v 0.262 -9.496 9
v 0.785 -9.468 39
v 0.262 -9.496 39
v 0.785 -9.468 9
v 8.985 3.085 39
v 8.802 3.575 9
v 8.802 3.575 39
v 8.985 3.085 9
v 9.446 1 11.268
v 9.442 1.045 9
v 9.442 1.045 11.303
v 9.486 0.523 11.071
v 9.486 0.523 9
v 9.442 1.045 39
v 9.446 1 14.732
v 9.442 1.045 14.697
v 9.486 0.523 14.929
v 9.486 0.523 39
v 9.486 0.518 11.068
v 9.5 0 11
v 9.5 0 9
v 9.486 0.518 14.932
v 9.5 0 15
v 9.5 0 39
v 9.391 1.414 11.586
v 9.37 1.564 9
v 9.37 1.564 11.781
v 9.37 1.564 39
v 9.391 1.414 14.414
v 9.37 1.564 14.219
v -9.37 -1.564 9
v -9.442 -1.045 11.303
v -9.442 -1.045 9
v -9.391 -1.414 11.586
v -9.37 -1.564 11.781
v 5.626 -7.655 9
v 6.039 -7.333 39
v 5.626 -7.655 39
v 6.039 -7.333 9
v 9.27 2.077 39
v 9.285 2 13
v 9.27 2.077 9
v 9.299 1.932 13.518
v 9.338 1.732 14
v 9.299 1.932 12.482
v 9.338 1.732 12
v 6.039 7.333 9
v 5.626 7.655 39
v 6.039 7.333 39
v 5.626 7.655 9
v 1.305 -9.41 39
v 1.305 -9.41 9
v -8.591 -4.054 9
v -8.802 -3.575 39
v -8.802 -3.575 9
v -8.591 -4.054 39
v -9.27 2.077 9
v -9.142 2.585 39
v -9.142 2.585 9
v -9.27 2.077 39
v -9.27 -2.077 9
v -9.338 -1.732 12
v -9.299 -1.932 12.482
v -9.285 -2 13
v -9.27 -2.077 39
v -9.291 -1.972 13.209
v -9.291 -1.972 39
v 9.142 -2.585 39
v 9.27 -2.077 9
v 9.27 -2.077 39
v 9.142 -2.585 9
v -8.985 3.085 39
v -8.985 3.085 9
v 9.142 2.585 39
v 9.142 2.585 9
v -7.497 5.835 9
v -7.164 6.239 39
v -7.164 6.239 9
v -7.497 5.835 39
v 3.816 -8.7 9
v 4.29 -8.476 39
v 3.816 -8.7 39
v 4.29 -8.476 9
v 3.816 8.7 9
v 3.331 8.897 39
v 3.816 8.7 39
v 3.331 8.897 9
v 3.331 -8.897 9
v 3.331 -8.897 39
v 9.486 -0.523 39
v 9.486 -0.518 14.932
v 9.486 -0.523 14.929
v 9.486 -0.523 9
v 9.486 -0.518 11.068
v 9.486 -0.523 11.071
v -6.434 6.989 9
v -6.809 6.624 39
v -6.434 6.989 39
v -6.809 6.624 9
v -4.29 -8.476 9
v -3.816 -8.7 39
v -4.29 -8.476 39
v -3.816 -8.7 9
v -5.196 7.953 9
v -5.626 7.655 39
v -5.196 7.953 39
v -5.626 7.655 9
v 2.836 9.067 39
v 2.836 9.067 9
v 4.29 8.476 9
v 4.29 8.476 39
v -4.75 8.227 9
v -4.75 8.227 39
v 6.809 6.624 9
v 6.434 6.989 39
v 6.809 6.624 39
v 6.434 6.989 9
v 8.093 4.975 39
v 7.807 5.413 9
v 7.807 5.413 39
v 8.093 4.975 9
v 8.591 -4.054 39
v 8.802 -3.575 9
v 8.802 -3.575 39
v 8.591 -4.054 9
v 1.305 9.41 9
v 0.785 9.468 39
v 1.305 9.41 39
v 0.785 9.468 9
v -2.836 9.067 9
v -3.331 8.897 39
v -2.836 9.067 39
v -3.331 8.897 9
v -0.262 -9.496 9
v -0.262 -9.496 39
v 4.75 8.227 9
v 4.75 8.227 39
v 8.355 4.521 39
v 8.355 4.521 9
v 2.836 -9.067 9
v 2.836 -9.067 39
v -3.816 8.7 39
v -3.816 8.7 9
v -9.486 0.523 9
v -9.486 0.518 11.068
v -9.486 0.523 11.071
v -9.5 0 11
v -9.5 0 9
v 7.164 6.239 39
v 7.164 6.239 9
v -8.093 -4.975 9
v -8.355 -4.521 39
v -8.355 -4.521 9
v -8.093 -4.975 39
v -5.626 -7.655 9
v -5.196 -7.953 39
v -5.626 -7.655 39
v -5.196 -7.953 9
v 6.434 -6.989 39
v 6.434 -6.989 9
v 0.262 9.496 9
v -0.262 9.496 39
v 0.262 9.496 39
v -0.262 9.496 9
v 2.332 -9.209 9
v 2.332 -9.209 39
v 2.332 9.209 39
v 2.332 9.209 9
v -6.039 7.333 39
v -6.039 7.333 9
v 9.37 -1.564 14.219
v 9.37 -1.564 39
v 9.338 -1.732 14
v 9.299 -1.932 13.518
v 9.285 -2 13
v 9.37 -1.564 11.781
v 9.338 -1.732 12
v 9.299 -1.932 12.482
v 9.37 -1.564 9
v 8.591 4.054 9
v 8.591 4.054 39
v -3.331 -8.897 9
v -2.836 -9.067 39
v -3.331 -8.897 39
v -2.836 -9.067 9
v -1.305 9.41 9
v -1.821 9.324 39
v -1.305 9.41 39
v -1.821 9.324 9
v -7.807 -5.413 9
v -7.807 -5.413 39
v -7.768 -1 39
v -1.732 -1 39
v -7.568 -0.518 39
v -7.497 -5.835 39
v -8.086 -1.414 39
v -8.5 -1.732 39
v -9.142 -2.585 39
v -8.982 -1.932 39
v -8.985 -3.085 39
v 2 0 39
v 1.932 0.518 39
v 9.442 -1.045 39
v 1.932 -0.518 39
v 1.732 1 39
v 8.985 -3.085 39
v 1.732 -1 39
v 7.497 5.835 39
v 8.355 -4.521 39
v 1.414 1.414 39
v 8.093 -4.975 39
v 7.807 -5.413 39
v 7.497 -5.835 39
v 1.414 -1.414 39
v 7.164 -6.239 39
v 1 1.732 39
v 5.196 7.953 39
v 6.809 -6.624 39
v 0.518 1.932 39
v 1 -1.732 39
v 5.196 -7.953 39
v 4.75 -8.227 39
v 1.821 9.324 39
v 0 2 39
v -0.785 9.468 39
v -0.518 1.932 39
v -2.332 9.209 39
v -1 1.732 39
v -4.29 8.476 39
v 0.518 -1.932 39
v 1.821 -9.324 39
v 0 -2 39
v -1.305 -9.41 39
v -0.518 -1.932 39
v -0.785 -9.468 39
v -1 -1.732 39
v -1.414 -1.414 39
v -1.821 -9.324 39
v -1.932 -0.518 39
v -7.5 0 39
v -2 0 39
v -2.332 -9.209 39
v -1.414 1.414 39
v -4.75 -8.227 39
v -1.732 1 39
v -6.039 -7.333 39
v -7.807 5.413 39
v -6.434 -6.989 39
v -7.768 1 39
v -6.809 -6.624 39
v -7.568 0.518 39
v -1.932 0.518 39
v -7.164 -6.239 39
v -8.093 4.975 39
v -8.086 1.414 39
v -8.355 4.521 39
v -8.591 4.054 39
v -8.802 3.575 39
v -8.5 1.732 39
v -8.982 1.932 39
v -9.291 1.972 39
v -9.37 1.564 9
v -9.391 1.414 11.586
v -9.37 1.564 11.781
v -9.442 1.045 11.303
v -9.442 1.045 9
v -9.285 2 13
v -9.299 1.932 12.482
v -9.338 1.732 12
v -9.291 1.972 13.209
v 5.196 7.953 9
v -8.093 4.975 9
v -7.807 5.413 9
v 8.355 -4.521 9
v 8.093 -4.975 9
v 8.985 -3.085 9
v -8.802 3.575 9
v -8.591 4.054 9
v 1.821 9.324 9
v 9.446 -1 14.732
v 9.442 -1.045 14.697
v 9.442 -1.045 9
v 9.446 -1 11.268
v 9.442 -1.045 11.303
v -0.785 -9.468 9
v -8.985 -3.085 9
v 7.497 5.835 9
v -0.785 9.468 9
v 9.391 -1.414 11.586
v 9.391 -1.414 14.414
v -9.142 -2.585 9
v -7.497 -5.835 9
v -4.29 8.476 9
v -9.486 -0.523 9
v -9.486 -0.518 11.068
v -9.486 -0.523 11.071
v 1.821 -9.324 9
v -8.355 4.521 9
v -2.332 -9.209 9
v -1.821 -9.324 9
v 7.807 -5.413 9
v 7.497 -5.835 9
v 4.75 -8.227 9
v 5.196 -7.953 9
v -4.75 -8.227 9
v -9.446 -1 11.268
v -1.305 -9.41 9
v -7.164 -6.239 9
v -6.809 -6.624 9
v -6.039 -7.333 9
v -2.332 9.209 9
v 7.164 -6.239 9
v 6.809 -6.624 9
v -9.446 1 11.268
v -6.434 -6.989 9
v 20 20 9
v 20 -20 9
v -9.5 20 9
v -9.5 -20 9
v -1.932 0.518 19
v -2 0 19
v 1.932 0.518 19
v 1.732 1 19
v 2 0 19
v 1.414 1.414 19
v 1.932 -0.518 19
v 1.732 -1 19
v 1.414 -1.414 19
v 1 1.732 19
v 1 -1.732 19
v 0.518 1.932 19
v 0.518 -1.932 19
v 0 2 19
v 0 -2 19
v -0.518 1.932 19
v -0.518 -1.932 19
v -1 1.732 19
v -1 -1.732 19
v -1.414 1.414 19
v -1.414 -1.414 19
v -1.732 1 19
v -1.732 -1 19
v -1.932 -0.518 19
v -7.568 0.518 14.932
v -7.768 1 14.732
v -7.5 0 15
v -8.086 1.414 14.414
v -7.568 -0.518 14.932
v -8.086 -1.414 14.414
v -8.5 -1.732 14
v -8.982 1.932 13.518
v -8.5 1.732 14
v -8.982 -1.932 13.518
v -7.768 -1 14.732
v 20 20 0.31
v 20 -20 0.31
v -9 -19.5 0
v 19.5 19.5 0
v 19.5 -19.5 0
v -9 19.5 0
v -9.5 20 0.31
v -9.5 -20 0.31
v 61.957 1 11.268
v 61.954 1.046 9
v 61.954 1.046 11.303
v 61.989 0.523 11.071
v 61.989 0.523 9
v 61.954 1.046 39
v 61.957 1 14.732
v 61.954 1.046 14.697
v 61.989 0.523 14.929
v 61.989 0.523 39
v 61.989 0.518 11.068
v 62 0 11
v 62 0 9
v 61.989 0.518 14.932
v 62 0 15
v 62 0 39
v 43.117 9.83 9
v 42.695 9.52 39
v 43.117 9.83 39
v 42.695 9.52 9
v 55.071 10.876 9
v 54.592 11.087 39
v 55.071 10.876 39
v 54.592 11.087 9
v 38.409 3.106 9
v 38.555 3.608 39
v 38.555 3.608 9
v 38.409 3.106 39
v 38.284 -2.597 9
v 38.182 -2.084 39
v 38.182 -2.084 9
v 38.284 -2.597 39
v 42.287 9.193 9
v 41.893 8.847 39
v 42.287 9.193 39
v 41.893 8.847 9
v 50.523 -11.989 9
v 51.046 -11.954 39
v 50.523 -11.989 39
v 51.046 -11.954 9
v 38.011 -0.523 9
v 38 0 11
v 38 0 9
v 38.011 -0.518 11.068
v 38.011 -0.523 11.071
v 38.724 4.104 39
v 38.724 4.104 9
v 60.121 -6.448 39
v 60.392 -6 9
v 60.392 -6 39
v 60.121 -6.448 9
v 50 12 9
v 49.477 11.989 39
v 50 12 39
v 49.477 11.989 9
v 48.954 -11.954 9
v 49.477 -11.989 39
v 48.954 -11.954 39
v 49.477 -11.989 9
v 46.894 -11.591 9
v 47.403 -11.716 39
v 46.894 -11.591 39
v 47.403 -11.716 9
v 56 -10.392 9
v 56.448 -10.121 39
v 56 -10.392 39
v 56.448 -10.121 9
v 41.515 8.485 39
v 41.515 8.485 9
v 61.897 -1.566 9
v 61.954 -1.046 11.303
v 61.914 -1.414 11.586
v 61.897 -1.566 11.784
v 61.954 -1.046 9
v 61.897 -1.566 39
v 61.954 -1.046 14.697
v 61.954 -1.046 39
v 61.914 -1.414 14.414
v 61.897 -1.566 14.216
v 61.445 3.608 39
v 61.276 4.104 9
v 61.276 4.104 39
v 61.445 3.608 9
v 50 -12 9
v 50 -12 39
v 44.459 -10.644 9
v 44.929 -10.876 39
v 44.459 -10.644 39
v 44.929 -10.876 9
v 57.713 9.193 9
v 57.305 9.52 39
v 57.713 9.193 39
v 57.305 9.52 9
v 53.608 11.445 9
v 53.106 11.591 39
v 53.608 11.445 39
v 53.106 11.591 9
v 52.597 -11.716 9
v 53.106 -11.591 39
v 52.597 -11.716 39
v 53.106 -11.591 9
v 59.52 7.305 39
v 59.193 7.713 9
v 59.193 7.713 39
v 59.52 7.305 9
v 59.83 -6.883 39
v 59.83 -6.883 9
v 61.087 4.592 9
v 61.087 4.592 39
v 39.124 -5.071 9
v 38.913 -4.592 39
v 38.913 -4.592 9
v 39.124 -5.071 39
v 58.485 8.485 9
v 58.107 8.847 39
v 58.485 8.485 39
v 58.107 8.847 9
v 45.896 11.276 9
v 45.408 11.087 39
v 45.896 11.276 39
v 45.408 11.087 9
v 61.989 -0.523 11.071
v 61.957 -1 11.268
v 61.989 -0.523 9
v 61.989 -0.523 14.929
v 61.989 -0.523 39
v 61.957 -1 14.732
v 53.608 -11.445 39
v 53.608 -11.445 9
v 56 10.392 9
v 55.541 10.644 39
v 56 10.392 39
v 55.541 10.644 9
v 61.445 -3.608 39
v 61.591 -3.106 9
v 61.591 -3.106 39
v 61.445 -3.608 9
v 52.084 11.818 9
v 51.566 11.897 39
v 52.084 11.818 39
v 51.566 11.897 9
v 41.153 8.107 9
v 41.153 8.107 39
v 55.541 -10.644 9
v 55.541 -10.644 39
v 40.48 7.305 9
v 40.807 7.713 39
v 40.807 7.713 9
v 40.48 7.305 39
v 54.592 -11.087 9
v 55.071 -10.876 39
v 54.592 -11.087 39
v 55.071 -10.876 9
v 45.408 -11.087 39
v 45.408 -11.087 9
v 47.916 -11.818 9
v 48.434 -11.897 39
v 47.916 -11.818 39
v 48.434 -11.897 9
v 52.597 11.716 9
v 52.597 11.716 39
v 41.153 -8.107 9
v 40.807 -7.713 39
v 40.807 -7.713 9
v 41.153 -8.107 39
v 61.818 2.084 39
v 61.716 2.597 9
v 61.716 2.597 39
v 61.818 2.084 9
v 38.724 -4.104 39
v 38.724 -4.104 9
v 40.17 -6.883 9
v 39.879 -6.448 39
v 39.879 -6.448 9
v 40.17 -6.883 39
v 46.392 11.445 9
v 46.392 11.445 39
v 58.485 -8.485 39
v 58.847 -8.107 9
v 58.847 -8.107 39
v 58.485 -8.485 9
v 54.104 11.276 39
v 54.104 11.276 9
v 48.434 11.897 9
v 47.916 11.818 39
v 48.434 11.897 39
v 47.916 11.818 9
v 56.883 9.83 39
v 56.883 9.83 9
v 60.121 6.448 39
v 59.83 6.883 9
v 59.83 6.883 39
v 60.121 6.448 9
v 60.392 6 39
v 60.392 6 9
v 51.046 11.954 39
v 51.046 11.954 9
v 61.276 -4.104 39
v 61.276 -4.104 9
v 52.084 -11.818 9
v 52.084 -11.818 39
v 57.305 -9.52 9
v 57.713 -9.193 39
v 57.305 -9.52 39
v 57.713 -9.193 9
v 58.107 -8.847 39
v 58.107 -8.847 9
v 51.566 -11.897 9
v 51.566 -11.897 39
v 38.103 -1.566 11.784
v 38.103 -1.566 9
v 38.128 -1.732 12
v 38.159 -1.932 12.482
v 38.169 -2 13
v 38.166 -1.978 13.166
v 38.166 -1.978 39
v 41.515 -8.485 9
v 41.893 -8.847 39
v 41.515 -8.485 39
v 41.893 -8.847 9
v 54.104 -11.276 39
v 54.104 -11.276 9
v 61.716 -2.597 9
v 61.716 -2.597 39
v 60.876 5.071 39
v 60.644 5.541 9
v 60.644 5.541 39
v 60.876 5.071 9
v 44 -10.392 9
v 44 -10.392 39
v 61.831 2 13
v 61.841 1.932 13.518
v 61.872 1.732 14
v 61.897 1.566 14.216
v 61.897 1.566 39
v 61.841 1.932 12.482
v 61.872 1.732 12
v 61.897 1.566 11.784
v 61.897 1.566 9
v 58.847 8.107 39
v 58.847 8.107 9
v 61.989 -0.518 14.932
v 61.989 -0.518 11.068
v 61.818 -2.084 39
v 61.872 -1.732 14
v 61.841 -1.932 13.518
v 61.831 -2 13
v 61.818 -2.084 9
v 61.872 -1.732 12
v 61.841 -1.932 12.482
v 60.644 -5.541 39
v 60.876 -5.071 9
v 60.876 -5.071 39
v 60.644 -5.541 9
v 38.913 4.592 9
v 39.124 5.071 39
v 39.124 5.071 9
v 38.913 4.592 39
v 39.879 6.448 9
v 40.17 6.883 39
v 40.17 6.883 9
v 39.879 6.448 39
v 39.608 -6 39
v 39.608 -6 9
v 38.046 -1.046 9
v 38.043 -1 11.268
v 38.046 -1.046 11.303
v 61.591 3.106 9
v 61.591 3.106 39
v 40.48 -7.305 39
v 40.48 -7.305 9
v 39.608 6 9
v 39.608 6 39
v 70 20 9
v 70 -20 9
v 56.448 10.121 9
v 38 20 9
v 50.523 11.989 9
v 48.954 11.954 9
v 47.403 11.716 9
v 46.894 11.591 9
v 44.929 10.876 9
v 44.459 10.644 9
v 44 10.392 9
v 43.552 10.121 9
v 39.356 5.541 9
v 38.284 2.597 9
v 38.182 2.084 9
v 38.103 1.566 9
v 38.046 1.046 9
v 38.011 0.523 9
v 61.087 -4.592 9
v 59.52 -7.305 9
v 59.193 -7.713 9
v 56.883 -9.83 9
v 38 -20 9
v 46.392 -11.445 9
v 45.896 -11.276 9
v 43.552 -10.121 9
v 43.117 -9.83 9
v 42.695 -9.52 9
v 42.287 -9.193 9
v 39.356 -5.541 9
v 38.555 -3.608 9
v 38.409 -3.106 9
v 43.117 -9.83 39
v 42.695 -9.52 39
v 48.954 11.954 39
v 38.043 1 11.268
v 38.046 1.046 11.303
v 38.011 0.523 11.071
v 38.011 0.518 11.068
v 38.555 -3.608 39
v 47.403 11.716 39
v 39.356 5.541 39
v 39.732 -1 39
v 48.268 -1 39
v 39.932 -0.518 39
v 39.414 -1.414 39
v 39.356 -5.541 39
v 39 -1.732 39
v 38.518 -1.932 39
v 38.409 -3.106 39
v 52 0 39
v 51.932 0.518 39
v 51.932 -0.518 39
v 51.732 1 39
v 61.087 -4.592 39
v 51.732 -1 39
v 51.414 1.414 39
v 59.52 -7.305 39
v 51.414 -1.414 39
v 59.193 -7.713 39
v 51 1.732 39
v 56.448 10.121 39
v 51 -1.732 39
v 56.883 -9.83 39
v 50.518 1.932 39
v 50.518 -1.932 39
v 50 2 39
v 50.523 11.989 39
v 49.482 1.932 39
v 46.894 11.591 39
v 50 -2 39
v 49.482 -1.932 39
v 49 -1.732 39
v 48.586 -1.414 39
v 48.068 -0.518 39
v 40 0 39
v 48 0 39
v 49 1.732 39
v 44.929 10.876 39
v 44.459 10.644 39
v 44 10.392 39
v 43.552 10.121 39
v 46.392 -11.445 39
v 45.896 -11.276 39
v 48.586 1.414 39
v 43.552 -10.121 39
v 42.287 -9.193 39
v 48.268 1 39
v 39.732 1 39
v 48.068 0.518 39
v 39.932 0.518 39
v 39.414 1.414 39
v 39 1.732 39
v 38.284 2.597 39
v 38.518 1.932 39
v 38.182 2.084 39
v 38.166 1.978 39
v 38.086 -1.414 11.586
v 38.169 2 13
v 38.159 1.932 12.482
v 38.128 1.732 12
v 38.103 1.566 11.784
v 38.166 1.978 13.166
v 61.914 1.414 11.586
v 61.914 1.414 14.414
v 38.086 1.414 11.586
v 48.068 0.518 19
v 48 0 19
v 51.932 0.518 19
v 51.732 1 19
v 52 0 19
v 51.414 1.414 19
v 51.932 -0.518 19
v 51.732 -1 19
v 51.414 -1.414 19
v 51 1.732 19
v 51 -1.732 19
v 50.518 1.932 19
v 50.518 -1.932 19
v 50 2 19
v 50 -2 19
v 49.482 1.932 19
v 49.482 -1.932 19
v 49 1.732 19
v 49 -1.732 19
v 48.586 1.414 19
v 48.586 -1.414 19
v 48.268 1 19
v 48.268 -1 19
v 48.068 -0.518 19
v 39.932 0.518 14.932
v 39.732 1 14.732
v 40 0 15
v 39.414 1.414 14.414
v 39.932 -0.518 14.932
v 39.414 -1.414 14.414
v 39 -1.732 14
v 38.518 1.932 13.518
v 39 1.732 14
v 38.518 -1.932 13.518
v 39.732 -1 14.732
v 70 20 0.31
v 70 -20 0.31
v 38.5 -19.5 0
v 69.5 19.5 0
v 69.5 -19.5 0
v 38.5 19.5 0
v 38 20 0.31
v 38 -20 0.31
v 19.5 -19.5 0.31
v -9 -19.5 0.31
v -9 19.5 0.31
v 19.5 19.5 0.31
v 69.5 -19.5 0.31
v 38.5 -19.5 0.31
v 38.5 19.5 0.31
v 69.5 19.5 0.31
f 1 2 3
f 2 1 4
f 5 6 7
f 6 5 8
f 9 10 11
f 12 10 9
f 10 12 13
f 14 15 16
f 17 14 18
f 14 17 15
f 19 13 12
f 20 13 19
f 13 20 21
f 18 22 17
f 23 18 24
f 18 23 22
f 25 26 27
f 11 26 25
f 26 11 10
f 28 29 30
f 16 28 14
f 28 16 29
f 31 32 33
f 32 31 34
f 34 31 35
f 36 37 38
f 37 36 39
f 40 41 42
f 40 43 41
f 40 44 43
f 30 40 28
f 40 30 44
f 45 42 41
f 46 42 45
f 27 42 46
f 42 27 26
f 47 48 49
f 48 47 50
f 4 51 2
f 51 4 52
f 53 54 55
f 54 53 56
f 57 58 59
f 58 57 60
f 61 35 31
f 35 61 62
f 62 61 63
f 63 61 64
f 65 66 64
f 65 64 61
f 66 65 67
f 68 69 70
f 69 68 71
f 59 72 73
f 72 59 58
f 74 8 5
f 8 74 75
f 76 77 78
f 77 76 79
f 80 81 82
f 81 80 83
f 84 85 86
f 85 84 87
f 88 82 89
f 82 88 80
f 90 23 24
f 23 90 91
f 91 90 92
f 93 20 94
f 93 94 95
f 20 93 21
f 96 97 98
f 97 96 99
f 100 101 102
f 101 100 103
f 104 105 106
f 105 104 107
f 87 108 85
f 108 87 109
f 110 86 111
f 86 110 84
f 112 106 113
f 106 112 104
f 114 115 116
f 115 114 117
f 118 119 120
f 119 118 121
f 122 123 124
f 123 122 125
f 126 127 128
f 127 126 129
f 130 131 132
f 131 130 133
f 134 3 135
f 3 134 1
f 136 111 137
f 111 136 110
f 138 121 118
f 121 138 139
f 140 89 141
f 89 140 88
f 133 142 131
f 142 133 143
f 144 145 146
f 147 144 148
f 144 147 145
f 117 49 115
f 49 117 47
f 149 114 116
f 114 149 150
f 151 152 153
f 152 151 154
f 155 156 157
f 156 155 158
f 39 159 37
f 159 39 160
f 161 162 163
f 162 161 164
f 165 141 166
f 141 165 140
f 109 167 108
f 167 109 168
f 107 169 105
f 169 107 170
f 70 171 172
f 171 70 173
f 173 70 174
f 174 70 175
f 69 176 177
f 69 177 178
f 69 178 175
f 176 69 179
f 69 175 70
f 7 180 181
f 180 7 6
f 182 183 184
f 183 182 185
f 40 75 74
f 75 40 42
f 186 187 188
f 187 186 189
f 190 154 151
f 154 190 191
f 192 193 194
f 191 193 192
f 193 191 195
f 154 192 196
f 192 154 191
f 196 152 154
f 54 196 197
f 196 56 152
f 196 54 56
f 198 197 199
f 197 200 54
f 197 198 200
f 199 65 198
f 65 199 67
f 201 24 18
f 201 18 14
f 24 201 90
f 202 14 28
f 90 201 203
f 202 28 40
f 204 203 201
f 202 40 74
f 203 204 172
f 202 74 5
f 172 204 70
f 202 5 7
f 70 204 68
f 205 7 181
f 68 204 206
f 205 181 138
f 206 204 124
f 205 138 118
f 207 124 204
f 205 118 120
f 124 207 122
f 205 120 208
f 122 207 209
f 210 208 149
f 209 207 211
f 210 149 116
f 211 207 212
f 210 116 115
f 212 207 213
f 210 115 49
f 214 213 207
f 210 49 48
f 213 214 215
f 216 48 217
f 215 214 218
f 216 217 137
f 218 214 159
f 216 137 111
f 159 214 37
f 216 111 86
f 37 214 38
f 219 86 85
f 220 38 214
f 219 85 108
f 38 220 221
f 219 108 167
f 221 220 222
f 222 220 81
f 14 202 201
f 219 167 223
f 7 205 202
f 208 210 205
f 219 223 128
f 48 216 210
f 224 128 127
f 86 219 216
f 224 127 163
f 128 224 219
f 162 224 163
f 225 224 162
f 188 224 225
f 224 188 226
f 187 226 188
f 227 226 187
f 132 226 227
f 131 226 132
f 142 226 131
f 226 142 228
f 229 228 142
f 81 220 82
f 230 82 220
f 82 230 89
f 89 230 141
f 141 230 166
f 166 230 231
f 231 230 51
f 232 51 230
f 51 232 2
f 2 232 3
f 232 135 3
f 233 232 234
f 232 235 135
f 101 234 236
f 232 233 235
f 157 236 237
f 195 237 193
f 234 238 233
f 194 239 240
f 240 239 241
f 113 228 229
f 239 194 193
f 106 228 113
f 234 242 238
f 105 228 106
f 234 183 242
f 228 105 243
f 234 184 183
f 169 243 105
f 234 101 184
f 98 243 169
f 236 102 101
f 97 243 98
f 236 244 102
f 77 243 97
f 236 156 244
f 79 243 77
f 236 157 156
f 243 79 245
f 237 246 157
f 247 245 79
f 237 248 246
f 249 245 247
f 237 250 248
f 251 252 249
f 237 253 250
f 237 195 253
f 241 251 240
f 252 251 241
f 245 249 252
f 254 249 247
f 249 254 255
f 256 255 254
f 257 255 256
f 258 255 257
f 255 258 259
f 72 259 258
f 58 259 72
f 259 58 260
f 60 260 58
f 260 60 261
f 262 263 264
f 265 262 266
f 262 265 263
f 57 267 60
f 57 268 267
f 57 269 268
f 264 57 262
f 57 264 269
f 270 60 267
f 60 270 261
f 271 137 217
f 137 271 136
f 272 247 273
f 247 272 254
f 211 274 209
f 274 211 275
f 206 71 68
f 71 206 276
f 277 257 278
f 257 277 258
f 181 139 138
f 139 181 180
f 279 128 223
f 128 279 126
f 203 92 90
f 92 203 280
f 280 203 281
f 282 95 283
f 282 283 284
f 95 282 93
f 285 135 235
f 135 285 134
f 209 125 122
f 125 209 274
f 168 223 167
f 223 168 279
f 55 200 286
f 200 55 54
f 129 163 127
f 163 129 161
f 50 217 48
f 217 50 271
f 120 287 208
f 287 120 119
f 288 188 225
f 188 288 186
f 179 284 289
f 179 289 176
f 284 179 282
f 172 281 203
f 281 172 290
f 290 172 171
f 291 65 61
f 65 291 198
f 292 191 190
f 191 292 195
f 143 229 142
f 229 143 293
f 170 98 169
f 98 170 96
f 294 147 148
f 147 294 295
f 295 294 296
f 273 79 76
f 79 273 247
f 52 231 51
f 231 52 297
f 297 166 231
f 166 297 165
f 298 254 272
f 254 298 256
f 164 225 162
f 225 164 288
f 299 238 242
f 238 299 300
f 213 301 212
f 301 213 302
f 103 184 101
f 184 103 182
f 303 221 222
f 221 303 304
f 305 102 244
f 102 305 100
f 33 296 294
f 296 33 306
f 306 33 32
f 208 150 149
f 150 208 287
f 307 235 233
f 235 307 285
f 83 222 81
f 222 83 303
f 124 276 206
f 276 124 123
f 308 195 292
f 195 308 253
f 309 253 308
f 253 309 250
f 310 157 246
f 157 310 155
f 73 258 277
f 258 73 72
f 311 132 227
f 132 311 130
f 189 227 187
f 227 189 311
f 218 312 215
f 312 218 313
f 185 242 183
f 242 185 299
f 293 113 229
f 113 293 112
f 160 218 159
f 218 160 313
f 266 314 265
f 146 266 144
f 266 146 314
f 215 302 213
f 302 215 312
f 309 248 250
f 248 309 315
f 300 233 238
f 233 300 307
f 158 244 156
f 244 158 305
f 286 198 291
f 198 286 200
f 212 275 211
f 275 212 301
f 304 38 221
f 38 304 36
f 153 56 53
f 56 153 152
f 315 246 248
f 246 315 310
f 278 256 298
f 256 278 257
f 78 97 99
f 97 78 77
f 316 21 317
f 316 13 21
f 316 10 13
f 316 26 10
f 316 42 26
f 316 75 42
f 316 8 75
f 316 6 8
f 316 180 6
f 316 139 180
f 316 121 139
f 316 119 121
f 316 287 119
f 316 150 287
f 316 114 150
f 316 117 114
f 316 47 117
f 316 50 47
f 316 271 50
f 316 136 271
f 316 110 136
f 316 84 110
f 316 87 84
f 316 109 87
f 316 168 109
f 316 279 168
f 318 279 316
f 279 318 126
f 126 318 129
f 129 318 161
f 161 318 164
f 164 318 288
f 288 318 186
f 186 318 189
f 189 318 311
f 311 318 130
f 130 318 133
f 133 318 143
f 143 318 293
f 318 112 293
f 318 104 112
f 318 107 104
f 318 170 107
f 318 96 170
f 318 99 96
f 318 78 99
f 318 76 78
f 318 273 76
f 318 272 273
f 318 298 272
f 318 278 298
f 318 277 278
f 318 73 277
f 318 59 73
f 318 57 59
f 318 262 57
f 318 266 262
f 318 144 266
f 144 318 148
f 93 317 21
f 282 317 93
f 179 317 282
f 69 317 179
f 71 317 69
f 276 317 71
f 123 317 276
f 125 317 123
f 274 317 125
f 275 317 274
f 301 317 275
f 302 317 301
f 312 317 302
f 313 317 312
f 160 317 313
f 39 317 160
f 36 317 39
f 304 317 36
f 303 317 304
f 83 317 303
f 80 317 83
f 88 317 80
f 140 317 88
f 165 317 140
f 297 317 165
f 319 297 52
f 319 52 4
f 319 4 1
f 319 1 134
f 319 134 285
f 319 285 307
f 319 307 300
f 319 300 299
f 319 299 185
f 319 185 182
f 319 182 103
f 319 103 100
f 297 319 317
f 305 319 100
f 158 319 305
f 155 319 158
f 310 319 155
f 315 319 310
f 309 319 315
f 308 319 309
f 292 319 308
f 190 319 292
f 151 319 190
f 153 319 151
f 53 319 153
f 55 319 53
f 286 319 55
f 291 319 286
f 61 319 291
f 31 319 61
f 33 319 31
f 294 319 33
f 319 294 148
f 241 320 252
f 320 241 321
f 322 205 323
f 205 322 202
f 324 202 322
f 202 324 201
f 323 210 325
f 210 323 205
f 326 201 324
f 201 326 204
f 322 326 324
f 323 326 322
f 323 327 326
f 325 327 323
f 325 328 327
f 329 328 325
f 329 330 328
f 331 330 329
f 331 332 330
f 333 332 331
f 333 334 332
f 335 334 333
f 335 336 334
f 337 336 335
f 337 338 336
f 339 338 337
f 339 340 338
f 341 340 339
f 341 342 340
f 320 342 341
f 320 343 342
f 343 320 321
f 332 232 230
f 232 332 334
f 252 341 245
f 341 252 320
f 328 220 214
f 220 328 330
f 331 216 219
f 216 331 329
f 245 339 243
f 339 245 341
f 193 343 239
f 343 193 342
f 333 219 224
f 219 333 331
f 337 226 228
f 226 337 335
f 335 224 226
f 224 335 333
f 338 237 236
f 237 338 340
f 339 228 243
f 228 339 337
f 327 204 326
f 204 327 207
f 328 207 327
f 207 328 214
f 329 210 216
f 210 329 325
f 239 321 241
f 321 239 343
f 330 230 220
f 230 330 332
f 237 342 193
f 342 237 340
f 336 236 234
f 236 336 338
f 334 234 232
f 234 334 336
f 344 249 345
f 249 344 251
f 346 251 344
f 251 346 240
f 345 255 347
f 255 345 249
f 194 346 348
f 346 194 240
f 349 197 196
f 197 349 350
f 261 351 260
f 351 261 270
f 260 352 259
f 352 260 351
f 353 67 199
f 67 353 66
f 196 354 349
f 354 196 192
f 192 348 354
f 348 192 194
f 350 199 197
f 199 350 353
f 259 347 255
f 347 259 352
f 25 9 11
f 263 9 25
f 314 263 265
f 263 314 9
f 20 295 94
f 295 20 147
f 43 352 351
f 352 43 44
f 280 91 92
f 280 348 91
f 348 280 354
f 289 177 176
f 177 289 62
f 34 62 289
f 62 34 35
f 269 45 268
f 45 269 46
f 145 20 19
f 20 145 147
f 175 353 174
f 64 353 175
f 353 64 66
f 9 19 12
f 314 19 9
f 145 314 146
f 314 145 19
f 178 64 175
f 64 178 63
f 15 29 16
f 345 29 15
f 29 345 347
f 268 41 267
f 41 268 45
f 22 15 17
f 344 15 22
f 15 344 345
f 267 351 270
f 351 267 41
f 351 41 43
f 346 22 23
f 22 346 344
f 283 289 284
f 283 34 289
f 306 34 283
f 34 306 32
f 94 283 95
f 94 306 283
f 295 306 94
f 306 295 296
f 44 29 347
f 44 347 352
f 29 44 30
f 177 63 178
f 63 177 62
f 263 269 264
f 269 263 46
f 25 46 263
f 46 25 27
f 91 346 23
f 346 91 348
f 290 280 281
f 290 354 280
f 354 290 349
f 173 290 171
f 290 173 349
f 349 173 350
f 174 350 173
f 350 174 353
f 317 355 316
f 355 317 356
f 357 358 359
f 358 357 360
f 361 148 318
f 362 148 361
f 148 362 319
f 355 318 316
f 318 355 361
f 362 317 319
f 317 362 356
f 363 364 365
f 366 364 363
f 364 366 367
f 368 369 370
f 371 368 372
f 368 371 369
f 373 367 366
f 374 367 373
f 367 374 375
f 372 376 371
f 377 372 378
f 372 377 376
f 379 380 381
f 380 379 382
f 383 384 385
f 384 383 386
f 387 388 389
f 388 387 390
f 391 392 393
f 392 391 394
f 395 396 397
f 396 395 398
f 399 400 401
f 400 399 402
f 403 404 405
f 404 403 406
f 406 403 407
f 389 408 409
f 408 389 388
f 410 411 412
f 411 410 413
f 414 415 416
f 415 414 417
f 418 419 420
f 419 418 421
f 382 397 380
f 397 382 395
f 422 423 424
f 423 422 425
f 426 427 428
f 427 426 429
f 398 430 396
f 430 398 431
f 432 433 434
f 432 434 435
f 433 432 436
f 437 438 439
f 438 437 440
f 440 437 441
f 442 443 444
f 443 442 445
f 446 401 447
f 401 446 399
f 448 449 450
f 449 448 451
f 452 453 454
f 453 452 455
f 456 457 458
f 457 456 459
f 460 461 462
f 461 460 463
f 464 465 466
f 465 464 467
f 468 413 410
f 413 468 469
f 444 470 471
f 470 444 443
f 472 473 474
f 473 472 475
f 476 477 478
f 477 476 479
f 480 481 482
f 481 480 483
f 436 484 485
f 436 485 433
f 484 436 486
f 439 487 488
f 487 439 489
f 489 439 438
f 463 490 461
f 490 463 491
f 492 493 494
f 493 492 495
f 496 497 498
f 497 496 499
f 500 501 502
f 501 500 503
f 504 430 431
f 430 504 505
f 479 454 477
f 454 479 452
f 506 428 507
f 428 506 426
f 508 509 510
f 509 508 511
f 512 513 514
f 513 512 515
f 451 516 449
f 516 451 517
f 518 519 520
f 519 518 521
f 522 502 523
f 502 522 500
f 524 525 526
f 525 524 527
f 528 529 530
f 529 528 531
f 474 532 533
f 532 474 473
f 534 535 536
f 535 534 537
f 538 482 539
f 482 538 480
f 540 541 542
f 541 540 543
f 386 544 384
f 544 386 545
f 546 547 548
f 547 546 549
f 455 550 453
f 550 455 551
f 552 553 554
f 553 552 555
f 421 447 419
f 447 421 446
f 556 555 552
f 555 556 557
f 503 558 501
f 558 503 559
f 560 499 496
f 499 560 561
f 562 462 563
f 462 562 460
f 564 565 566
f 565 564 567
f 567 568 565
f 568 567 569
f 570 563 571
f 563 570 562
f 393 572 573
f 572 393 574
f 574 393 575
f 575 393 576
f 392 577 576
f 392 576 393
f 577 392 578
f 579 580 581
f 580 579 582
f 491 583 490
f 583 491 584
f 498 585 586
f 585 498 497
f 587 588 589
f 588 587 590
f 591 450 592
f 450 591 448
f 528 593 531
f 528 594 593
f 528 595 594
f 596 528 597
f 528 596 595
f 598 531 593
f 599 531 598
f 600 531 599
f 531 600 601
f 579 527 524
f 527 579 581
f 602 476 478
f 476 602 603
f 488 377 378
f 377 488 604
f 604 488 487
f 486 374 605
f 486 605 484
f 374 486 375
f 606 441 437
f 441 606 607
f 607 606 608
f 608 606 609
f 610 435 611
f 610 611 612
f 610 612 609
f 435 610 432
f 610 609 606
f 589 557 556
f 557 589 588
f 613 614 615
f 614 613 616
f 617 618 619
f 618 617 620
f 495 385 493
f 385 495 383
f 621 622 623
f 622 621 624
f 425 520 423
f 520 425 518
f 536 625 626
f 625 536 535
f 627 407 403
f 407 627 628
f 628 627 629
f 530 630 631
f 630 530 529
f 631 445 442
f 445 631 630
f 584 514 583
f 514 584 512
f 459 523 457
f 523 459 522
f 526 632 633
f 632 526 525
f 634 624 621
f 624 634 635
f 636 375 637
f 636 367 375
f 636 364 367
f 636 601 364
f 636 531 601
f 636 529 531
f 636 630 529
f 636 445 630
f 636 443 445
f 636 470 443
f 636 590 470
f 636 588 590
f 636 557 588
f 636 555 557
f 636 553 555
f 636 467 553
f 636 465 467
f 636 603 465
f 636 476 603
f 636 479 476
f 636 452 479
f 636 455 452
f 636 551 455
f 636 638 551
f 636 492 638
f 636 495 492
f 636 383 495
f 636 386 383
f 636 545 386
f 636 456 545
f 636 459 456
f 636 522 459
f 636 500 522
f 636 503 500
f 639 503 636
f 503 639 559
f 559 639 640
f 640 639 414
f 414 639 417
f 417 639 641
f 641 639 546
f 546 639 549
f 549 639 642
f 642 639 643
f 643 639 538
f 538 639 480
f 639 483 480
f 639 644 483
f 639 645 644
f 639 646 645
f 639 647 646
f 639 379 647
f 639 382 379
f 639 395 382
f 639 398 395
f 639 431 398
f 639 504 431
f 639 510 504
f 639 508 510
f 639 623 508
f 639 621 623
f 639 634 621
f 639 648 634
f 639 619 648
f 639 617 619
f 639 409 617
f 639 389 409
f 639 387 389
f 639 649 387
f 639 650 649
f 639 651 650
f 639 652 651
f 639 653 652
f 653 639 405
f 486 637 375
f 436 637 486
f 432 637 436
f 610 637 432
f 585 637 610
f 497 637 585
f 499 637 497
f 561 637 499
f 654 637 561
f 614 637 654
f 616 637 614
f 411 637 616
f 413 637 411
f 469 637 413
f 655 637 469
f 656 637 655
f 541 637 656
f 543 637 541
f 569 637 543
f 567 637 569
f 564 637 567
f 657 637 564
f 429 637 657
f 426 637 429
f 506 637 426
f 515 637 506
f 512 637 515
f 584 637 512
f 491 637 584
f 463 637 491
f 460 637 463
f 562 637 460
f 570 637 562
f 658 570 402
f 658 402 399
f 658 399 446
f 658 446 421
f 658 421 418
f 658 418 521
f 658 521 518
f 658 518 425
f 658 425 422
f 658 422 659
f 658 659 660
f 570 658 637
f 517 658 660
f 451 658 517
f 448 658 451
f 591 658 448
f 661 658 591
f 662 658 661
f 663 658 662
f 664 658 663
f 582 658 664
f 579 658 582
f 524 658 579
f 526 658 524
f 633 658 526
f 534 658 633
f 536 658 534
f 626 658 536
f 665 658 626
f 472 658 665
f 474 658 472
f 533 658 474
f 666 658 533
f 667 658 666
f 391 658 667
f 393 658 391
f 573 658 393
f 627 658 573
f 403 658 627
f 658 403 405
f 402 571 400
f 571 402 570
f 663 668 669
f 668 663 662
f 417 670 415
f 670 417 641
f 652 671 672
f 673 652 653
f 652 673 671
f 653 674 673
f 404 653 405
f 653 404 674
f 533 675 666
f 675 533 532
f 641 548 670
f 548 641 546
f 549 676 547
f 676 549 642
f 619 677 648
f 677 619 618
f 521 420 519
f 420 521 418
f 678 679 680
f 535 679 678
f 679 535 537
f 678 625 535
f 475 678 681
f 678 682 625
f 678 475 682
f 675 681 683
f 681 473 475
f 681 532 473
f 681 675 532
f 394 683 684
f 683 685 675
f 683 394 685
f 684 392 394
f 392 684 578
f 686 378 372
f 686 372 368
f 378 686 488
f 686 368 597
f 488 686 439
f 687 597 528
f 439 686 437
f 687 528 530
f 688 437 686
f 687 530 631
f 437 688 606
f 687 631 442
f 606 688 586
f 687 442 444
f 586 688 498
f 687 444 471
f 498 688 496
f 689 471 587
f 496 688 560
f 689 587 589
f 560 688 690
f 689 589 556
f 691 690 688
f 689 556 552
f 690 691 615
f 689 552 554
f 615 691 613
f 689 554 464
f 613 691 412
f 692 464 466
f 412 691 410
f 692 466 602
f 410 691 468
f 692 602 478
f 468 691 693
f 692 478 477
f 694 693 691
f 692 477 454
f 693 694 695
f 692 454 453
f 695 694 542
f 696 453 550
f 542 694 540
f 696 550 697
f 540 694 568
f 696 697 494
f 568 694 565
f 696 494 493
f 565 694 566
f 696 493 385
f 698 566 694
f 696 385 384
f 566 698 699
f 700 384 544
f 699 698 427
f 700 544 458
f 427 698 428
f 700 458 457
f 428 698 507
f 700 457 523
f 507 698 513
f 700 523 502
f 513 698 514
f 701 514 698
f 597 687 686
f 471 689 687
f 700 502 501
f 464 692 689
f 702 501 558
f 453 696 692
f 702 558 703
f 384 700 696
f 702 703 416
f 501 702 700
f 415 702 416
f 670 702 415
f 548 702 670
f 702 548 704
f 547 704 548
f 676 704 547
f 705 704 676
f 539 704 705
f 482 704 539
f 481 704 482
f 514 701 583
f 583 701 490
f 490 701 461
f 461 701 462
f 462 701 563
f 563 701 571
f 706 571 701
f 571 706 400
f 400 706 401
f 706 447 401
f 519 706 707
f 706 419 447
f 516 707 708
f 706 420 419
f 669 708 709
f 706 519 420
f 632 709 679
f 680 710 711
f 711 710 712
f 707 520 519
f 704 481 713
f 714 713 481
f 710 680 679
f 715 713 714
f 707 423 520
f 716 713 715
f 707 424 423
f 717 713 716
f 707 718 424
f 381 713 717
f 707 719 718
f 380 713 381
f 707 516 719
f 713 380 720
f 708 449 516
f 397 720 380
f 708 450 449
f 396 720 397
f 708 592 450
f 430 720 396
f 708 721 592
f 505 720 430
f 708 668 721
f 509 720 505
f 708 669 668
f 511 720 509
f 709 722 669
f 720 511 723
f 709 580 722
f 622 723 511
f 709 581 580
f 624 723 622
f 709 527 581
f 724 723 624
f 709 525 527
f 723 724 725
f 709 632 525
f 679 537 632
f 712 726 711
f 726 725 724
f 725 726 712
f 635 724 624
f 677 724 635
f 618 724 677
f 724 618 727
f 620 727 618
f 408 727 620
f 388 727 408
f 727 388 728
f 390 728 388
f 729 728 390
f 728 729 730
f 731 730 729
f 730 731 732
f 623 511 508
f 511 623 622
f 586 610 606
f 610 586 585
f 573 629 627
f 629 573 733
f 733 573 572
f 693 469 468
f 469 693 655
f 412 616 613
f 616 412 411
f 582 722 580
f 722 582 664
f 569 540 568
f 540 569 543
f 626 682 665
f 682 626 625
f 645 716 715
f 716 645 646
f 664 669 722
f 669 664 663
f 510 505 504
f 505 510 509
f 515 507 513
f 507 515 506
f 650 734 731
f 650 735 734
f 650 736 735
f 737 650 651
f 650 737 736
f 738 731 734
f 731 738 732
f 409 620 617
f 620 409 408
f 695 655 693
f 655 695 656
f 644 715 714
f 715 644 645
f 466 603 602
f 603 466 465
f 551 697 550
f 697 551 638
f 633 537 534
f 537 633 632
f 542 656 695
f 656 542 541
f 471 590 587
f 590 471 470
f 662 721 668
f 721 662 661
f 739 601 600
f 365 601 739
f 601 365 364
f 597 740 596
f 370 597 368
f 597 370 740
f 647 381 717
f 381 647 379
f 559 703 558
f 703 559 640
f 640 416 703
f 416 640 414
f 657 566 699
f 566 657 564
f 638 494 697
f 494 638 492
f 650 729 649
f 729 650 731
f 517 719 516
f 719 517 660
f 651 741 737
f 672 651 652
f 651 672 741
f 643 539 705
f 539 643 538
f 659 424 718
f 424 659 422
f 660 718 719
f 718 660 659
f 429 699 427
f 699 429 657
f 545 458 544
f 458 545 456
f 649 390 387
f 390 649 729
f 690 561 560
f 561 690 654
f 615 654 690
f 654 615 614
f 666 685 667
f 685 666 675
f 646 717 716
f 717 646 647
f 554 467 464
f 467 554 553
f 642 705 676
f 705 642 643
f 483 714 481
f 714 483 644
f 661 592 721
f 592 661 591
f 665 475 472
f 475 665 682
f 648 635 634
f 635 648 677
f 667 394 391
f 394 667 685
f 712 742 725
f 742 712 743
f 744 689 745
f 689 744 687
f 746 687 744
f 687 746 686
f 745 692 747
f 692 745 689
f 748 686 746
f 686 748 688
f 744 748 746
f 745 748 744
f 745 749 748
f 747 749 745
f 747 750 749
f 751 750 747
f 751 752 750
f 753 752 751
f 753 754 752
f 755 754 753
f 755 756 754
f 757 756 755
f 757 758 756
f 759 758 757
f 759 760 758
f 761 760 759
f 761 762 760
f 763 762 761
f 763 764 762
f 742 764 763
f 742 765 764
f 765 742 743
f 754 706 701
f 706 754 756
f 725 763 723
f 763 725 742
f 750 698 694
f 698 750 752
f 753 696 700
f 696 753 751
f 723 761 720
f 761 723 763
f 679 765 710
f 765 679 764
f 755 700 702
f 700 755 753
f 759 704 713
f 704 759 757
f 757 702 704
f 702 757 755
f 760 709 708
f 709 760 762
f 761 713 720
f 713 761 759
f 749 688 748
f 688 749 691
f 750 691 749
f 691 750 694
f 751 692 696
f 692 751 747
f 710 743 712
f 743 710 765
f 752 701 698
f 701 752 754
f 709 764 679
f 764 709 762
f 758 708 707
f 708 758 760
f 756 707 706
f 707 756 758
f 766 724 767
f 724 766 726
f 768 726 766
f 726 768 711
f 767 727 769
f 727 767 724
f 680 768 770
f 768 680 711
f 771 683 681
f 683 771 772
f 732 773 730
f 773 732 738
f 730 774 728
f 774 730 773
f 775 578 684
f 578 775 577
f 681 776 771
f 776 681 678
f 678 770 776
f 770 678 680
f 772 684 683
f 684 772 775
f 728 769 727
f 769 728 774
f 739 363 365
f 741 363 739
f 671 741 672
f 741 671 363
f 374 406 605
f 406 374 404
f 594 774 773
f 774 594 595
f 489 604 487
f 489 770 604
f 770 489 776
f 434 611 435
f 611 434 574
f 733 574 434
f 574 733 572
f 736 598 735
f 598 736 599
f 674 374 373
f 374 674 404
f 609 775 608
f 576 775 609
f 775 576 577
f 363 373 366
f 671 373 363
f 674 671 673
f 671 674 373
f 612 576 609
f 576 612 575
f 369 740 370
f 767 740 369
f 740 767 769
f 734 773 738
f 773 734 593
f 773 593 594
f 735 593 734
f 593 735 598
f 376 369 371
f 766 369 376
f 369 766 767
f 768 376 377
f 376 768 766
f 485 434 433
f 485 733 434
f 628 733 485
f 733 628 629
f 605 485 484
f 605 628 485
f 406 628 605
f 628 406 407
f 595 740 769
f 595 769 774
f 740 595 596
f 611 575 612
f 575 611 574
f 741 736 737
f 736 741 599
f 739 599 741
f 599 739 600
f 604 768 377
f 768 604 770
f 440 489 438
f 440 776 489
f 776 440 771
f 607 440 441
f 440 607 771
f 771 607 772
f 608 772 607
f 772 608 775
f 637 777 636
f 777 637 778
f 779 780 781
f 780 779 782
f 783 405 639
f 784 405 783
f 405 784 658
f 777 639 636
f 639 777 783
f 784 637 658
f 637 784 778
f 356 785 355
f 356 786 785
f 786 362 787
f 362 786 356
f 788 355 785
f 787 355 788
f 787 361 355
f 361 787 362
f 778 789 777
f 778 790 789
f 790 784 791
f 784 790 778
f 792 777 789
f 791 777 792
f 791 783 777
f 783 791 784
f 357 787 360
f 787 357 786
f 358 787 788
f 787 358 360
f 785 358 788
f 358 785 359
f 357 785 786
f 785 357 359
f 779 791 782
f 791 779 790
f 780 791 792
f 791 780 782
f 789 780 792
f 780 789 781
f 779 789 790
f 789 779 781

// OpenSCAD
// file: atis_lib.scad
module gyuru(r1, r2,h, w, center=false){
    difference(){
        cylinder(r1=r1,r2=r2,h, center=center, $fn=12*r1);
        cylinder(r1=r1-w, r2=r2-w,h, center=center, $fn=12*(r1-w));
    }
}

//inset_width= min(nozzle dia/2, 0.4)
module inset_first_layer(inset_height=0.31,inset_width=0.2, render=false)
{   
    if (render == true){
        difference()
        { 
            children();

            translate([0,0,-1])
            linear_extrude(height=inset_height+1)
            difference()
            {
                offset(r = inset_width) 
                projection(cut=true) 
                translate([0,0,-inset_height])
                children();

                offset(r = -inset_width) 
                projection(cut=true) 
                translate([0,0,-inset_height])
                children();
            }
        } 
    }
    else{
        echo("Inset not rendered!");
    }
} 

module deszka(m, sz, v, cimke){
    cube([m,sz,v], center=true);
    if (m == vastagsag){
        t = sz * v;
        echo(cimke, m , sz, v, t/1000/1000);
    }
    if (sz == vastagsag){
        t = m*v;
        echo(cimke, m , sz, v, t/1000/1000);
    }
    if (v == vastagsag){
        t = m*sz;
        echo(cimke, m , sz, v, t/1000/1000);
    }
    //echo(cimke, m , sz, v, t);
}



// csm=[melyseg, szelesseg, magassag, also resz magassag, ,henger sugara

//csatlakozo([5,10,20,2,2,1.5]);

module csatlakozo(csm){
    cw = csm[0];
    sz = csm[1];
    h = csm[2];
    ch = csm[3];
    ny = csm[4];
    R=csm[5];
    translate([-cw/2, -sz/2, -h/2]){
        cube([cw,sz,ch]);
        translate([0,sz,ch])
            rotate([90,0,0])
                linear_extrude(height=sz)polygon([[0,0], [cw, 0], [0,cw+1], [0,0]]);
        translate([0,(sz-ny)/2,0])
        intersection()
        {
            translate([0,R+ny/2,0])
                rotate([90,0,0])
                    linear_extrude(height=2*R)polygon([[0,0], [cw, 0], [cw, h-cw-1], [0,h], [0,0]]);
            union(){
                cube([ny, ny,h]);
                translate([cw-R-0.5,ny/2,0]) cylinder(r=R, h=h,$fn=80);
            }
        }
    }
}

module gombolyitett_csatlakozo(csm){
    cw = csm[0]-1;
    sz = csm[1]-2;
    h = csm[2]-2;
    ch = csm[3];
    ny = csm[4];
    R=csm[5];
    translate([-cw/2, -sz/2, -h/2]){
        cube([cw,sz,ch]);
        translate([0,sz,ch])
            rotate([90,0,0])
                linear_extrude(height=sz)polygon([[0,0], [cw, 0], [0,cw+1], [0,0]]);
        translate([0,(sz-ny)/2,0])
        intersection()
        {
            translate([0,R+ny/2,0])
                rotate([90,0,0])
                    linear_extrude(height=2*R)polygon([[0,0], [cw, 0], [cw, h-cw-1], [0,h], [0,0]]);
            union(){
                cube([ny, ny,h]);
                translate([cw-R-0.5,ny/2,0]) cylinder(r=R, h=h,$fn=80);
            }
        }
    }
}
// main file
use  <atis_lib.scad>;

//egyenes_2lyukas_benchdog();
inset_first_layer(inset_height=0.31,inset_width=0.5, render=true){
translate([0,0,4.5]){hengeres_elem();
translate([50,0,0])hengeres_elem(12);
}
}

//derekszogu_3lyukas_benchdog();

module hengeres_elem(r_kulso=9.5, r_rugo=2){
    translate([10-r_kulso/2,0,0])cube([20+r_kulso,40,9], center=true);
    translate([0,0,4.5])difference(){
        cylinder(r=r_kulso,h=30, $fn=r_kulso*12);
        translate([0,0,10])cylinder(r=r_rugo,h=250, $fn=r_rugo*12);
        translate([-r_kulso,0,4])cylinder(r=r_rugo,h=50, $fn=r_rugo*12);
        translate([-r_kulso,0,4])rotate([0,90,0])cylinder(r=r_rugo,h=50, $fn=r_rugo*12);                        
    }
}
module egyenes_2lyukas_benchdog(){ // makeme
    //inset_first_layer(inset_height=0.31,inset_width=0.5, render=true)
    {
        translate([0,12.5,0]){
            hengeres_elem();
        }
        translate([100,12,0])rotate(180)hengeres_elem(r_kulso=12, r_rugo=2);
        translate([0,12,0]) cylinder(r=12,h=9, $fn=12*12.5);
        linear_extrude(height=9) polygon(points=[[0,24],[100,24],[100,0], [0,0],[0,26]]);
    }
}

module derekszogu_3lyukas_benchdog(){ // makeme
    translate([0,-12.5,0])egyenes_2lyukas_benchdog();
    rotate(90)translate([0,-12.5,0])egyenes_2lyukas_benchdog();
}
